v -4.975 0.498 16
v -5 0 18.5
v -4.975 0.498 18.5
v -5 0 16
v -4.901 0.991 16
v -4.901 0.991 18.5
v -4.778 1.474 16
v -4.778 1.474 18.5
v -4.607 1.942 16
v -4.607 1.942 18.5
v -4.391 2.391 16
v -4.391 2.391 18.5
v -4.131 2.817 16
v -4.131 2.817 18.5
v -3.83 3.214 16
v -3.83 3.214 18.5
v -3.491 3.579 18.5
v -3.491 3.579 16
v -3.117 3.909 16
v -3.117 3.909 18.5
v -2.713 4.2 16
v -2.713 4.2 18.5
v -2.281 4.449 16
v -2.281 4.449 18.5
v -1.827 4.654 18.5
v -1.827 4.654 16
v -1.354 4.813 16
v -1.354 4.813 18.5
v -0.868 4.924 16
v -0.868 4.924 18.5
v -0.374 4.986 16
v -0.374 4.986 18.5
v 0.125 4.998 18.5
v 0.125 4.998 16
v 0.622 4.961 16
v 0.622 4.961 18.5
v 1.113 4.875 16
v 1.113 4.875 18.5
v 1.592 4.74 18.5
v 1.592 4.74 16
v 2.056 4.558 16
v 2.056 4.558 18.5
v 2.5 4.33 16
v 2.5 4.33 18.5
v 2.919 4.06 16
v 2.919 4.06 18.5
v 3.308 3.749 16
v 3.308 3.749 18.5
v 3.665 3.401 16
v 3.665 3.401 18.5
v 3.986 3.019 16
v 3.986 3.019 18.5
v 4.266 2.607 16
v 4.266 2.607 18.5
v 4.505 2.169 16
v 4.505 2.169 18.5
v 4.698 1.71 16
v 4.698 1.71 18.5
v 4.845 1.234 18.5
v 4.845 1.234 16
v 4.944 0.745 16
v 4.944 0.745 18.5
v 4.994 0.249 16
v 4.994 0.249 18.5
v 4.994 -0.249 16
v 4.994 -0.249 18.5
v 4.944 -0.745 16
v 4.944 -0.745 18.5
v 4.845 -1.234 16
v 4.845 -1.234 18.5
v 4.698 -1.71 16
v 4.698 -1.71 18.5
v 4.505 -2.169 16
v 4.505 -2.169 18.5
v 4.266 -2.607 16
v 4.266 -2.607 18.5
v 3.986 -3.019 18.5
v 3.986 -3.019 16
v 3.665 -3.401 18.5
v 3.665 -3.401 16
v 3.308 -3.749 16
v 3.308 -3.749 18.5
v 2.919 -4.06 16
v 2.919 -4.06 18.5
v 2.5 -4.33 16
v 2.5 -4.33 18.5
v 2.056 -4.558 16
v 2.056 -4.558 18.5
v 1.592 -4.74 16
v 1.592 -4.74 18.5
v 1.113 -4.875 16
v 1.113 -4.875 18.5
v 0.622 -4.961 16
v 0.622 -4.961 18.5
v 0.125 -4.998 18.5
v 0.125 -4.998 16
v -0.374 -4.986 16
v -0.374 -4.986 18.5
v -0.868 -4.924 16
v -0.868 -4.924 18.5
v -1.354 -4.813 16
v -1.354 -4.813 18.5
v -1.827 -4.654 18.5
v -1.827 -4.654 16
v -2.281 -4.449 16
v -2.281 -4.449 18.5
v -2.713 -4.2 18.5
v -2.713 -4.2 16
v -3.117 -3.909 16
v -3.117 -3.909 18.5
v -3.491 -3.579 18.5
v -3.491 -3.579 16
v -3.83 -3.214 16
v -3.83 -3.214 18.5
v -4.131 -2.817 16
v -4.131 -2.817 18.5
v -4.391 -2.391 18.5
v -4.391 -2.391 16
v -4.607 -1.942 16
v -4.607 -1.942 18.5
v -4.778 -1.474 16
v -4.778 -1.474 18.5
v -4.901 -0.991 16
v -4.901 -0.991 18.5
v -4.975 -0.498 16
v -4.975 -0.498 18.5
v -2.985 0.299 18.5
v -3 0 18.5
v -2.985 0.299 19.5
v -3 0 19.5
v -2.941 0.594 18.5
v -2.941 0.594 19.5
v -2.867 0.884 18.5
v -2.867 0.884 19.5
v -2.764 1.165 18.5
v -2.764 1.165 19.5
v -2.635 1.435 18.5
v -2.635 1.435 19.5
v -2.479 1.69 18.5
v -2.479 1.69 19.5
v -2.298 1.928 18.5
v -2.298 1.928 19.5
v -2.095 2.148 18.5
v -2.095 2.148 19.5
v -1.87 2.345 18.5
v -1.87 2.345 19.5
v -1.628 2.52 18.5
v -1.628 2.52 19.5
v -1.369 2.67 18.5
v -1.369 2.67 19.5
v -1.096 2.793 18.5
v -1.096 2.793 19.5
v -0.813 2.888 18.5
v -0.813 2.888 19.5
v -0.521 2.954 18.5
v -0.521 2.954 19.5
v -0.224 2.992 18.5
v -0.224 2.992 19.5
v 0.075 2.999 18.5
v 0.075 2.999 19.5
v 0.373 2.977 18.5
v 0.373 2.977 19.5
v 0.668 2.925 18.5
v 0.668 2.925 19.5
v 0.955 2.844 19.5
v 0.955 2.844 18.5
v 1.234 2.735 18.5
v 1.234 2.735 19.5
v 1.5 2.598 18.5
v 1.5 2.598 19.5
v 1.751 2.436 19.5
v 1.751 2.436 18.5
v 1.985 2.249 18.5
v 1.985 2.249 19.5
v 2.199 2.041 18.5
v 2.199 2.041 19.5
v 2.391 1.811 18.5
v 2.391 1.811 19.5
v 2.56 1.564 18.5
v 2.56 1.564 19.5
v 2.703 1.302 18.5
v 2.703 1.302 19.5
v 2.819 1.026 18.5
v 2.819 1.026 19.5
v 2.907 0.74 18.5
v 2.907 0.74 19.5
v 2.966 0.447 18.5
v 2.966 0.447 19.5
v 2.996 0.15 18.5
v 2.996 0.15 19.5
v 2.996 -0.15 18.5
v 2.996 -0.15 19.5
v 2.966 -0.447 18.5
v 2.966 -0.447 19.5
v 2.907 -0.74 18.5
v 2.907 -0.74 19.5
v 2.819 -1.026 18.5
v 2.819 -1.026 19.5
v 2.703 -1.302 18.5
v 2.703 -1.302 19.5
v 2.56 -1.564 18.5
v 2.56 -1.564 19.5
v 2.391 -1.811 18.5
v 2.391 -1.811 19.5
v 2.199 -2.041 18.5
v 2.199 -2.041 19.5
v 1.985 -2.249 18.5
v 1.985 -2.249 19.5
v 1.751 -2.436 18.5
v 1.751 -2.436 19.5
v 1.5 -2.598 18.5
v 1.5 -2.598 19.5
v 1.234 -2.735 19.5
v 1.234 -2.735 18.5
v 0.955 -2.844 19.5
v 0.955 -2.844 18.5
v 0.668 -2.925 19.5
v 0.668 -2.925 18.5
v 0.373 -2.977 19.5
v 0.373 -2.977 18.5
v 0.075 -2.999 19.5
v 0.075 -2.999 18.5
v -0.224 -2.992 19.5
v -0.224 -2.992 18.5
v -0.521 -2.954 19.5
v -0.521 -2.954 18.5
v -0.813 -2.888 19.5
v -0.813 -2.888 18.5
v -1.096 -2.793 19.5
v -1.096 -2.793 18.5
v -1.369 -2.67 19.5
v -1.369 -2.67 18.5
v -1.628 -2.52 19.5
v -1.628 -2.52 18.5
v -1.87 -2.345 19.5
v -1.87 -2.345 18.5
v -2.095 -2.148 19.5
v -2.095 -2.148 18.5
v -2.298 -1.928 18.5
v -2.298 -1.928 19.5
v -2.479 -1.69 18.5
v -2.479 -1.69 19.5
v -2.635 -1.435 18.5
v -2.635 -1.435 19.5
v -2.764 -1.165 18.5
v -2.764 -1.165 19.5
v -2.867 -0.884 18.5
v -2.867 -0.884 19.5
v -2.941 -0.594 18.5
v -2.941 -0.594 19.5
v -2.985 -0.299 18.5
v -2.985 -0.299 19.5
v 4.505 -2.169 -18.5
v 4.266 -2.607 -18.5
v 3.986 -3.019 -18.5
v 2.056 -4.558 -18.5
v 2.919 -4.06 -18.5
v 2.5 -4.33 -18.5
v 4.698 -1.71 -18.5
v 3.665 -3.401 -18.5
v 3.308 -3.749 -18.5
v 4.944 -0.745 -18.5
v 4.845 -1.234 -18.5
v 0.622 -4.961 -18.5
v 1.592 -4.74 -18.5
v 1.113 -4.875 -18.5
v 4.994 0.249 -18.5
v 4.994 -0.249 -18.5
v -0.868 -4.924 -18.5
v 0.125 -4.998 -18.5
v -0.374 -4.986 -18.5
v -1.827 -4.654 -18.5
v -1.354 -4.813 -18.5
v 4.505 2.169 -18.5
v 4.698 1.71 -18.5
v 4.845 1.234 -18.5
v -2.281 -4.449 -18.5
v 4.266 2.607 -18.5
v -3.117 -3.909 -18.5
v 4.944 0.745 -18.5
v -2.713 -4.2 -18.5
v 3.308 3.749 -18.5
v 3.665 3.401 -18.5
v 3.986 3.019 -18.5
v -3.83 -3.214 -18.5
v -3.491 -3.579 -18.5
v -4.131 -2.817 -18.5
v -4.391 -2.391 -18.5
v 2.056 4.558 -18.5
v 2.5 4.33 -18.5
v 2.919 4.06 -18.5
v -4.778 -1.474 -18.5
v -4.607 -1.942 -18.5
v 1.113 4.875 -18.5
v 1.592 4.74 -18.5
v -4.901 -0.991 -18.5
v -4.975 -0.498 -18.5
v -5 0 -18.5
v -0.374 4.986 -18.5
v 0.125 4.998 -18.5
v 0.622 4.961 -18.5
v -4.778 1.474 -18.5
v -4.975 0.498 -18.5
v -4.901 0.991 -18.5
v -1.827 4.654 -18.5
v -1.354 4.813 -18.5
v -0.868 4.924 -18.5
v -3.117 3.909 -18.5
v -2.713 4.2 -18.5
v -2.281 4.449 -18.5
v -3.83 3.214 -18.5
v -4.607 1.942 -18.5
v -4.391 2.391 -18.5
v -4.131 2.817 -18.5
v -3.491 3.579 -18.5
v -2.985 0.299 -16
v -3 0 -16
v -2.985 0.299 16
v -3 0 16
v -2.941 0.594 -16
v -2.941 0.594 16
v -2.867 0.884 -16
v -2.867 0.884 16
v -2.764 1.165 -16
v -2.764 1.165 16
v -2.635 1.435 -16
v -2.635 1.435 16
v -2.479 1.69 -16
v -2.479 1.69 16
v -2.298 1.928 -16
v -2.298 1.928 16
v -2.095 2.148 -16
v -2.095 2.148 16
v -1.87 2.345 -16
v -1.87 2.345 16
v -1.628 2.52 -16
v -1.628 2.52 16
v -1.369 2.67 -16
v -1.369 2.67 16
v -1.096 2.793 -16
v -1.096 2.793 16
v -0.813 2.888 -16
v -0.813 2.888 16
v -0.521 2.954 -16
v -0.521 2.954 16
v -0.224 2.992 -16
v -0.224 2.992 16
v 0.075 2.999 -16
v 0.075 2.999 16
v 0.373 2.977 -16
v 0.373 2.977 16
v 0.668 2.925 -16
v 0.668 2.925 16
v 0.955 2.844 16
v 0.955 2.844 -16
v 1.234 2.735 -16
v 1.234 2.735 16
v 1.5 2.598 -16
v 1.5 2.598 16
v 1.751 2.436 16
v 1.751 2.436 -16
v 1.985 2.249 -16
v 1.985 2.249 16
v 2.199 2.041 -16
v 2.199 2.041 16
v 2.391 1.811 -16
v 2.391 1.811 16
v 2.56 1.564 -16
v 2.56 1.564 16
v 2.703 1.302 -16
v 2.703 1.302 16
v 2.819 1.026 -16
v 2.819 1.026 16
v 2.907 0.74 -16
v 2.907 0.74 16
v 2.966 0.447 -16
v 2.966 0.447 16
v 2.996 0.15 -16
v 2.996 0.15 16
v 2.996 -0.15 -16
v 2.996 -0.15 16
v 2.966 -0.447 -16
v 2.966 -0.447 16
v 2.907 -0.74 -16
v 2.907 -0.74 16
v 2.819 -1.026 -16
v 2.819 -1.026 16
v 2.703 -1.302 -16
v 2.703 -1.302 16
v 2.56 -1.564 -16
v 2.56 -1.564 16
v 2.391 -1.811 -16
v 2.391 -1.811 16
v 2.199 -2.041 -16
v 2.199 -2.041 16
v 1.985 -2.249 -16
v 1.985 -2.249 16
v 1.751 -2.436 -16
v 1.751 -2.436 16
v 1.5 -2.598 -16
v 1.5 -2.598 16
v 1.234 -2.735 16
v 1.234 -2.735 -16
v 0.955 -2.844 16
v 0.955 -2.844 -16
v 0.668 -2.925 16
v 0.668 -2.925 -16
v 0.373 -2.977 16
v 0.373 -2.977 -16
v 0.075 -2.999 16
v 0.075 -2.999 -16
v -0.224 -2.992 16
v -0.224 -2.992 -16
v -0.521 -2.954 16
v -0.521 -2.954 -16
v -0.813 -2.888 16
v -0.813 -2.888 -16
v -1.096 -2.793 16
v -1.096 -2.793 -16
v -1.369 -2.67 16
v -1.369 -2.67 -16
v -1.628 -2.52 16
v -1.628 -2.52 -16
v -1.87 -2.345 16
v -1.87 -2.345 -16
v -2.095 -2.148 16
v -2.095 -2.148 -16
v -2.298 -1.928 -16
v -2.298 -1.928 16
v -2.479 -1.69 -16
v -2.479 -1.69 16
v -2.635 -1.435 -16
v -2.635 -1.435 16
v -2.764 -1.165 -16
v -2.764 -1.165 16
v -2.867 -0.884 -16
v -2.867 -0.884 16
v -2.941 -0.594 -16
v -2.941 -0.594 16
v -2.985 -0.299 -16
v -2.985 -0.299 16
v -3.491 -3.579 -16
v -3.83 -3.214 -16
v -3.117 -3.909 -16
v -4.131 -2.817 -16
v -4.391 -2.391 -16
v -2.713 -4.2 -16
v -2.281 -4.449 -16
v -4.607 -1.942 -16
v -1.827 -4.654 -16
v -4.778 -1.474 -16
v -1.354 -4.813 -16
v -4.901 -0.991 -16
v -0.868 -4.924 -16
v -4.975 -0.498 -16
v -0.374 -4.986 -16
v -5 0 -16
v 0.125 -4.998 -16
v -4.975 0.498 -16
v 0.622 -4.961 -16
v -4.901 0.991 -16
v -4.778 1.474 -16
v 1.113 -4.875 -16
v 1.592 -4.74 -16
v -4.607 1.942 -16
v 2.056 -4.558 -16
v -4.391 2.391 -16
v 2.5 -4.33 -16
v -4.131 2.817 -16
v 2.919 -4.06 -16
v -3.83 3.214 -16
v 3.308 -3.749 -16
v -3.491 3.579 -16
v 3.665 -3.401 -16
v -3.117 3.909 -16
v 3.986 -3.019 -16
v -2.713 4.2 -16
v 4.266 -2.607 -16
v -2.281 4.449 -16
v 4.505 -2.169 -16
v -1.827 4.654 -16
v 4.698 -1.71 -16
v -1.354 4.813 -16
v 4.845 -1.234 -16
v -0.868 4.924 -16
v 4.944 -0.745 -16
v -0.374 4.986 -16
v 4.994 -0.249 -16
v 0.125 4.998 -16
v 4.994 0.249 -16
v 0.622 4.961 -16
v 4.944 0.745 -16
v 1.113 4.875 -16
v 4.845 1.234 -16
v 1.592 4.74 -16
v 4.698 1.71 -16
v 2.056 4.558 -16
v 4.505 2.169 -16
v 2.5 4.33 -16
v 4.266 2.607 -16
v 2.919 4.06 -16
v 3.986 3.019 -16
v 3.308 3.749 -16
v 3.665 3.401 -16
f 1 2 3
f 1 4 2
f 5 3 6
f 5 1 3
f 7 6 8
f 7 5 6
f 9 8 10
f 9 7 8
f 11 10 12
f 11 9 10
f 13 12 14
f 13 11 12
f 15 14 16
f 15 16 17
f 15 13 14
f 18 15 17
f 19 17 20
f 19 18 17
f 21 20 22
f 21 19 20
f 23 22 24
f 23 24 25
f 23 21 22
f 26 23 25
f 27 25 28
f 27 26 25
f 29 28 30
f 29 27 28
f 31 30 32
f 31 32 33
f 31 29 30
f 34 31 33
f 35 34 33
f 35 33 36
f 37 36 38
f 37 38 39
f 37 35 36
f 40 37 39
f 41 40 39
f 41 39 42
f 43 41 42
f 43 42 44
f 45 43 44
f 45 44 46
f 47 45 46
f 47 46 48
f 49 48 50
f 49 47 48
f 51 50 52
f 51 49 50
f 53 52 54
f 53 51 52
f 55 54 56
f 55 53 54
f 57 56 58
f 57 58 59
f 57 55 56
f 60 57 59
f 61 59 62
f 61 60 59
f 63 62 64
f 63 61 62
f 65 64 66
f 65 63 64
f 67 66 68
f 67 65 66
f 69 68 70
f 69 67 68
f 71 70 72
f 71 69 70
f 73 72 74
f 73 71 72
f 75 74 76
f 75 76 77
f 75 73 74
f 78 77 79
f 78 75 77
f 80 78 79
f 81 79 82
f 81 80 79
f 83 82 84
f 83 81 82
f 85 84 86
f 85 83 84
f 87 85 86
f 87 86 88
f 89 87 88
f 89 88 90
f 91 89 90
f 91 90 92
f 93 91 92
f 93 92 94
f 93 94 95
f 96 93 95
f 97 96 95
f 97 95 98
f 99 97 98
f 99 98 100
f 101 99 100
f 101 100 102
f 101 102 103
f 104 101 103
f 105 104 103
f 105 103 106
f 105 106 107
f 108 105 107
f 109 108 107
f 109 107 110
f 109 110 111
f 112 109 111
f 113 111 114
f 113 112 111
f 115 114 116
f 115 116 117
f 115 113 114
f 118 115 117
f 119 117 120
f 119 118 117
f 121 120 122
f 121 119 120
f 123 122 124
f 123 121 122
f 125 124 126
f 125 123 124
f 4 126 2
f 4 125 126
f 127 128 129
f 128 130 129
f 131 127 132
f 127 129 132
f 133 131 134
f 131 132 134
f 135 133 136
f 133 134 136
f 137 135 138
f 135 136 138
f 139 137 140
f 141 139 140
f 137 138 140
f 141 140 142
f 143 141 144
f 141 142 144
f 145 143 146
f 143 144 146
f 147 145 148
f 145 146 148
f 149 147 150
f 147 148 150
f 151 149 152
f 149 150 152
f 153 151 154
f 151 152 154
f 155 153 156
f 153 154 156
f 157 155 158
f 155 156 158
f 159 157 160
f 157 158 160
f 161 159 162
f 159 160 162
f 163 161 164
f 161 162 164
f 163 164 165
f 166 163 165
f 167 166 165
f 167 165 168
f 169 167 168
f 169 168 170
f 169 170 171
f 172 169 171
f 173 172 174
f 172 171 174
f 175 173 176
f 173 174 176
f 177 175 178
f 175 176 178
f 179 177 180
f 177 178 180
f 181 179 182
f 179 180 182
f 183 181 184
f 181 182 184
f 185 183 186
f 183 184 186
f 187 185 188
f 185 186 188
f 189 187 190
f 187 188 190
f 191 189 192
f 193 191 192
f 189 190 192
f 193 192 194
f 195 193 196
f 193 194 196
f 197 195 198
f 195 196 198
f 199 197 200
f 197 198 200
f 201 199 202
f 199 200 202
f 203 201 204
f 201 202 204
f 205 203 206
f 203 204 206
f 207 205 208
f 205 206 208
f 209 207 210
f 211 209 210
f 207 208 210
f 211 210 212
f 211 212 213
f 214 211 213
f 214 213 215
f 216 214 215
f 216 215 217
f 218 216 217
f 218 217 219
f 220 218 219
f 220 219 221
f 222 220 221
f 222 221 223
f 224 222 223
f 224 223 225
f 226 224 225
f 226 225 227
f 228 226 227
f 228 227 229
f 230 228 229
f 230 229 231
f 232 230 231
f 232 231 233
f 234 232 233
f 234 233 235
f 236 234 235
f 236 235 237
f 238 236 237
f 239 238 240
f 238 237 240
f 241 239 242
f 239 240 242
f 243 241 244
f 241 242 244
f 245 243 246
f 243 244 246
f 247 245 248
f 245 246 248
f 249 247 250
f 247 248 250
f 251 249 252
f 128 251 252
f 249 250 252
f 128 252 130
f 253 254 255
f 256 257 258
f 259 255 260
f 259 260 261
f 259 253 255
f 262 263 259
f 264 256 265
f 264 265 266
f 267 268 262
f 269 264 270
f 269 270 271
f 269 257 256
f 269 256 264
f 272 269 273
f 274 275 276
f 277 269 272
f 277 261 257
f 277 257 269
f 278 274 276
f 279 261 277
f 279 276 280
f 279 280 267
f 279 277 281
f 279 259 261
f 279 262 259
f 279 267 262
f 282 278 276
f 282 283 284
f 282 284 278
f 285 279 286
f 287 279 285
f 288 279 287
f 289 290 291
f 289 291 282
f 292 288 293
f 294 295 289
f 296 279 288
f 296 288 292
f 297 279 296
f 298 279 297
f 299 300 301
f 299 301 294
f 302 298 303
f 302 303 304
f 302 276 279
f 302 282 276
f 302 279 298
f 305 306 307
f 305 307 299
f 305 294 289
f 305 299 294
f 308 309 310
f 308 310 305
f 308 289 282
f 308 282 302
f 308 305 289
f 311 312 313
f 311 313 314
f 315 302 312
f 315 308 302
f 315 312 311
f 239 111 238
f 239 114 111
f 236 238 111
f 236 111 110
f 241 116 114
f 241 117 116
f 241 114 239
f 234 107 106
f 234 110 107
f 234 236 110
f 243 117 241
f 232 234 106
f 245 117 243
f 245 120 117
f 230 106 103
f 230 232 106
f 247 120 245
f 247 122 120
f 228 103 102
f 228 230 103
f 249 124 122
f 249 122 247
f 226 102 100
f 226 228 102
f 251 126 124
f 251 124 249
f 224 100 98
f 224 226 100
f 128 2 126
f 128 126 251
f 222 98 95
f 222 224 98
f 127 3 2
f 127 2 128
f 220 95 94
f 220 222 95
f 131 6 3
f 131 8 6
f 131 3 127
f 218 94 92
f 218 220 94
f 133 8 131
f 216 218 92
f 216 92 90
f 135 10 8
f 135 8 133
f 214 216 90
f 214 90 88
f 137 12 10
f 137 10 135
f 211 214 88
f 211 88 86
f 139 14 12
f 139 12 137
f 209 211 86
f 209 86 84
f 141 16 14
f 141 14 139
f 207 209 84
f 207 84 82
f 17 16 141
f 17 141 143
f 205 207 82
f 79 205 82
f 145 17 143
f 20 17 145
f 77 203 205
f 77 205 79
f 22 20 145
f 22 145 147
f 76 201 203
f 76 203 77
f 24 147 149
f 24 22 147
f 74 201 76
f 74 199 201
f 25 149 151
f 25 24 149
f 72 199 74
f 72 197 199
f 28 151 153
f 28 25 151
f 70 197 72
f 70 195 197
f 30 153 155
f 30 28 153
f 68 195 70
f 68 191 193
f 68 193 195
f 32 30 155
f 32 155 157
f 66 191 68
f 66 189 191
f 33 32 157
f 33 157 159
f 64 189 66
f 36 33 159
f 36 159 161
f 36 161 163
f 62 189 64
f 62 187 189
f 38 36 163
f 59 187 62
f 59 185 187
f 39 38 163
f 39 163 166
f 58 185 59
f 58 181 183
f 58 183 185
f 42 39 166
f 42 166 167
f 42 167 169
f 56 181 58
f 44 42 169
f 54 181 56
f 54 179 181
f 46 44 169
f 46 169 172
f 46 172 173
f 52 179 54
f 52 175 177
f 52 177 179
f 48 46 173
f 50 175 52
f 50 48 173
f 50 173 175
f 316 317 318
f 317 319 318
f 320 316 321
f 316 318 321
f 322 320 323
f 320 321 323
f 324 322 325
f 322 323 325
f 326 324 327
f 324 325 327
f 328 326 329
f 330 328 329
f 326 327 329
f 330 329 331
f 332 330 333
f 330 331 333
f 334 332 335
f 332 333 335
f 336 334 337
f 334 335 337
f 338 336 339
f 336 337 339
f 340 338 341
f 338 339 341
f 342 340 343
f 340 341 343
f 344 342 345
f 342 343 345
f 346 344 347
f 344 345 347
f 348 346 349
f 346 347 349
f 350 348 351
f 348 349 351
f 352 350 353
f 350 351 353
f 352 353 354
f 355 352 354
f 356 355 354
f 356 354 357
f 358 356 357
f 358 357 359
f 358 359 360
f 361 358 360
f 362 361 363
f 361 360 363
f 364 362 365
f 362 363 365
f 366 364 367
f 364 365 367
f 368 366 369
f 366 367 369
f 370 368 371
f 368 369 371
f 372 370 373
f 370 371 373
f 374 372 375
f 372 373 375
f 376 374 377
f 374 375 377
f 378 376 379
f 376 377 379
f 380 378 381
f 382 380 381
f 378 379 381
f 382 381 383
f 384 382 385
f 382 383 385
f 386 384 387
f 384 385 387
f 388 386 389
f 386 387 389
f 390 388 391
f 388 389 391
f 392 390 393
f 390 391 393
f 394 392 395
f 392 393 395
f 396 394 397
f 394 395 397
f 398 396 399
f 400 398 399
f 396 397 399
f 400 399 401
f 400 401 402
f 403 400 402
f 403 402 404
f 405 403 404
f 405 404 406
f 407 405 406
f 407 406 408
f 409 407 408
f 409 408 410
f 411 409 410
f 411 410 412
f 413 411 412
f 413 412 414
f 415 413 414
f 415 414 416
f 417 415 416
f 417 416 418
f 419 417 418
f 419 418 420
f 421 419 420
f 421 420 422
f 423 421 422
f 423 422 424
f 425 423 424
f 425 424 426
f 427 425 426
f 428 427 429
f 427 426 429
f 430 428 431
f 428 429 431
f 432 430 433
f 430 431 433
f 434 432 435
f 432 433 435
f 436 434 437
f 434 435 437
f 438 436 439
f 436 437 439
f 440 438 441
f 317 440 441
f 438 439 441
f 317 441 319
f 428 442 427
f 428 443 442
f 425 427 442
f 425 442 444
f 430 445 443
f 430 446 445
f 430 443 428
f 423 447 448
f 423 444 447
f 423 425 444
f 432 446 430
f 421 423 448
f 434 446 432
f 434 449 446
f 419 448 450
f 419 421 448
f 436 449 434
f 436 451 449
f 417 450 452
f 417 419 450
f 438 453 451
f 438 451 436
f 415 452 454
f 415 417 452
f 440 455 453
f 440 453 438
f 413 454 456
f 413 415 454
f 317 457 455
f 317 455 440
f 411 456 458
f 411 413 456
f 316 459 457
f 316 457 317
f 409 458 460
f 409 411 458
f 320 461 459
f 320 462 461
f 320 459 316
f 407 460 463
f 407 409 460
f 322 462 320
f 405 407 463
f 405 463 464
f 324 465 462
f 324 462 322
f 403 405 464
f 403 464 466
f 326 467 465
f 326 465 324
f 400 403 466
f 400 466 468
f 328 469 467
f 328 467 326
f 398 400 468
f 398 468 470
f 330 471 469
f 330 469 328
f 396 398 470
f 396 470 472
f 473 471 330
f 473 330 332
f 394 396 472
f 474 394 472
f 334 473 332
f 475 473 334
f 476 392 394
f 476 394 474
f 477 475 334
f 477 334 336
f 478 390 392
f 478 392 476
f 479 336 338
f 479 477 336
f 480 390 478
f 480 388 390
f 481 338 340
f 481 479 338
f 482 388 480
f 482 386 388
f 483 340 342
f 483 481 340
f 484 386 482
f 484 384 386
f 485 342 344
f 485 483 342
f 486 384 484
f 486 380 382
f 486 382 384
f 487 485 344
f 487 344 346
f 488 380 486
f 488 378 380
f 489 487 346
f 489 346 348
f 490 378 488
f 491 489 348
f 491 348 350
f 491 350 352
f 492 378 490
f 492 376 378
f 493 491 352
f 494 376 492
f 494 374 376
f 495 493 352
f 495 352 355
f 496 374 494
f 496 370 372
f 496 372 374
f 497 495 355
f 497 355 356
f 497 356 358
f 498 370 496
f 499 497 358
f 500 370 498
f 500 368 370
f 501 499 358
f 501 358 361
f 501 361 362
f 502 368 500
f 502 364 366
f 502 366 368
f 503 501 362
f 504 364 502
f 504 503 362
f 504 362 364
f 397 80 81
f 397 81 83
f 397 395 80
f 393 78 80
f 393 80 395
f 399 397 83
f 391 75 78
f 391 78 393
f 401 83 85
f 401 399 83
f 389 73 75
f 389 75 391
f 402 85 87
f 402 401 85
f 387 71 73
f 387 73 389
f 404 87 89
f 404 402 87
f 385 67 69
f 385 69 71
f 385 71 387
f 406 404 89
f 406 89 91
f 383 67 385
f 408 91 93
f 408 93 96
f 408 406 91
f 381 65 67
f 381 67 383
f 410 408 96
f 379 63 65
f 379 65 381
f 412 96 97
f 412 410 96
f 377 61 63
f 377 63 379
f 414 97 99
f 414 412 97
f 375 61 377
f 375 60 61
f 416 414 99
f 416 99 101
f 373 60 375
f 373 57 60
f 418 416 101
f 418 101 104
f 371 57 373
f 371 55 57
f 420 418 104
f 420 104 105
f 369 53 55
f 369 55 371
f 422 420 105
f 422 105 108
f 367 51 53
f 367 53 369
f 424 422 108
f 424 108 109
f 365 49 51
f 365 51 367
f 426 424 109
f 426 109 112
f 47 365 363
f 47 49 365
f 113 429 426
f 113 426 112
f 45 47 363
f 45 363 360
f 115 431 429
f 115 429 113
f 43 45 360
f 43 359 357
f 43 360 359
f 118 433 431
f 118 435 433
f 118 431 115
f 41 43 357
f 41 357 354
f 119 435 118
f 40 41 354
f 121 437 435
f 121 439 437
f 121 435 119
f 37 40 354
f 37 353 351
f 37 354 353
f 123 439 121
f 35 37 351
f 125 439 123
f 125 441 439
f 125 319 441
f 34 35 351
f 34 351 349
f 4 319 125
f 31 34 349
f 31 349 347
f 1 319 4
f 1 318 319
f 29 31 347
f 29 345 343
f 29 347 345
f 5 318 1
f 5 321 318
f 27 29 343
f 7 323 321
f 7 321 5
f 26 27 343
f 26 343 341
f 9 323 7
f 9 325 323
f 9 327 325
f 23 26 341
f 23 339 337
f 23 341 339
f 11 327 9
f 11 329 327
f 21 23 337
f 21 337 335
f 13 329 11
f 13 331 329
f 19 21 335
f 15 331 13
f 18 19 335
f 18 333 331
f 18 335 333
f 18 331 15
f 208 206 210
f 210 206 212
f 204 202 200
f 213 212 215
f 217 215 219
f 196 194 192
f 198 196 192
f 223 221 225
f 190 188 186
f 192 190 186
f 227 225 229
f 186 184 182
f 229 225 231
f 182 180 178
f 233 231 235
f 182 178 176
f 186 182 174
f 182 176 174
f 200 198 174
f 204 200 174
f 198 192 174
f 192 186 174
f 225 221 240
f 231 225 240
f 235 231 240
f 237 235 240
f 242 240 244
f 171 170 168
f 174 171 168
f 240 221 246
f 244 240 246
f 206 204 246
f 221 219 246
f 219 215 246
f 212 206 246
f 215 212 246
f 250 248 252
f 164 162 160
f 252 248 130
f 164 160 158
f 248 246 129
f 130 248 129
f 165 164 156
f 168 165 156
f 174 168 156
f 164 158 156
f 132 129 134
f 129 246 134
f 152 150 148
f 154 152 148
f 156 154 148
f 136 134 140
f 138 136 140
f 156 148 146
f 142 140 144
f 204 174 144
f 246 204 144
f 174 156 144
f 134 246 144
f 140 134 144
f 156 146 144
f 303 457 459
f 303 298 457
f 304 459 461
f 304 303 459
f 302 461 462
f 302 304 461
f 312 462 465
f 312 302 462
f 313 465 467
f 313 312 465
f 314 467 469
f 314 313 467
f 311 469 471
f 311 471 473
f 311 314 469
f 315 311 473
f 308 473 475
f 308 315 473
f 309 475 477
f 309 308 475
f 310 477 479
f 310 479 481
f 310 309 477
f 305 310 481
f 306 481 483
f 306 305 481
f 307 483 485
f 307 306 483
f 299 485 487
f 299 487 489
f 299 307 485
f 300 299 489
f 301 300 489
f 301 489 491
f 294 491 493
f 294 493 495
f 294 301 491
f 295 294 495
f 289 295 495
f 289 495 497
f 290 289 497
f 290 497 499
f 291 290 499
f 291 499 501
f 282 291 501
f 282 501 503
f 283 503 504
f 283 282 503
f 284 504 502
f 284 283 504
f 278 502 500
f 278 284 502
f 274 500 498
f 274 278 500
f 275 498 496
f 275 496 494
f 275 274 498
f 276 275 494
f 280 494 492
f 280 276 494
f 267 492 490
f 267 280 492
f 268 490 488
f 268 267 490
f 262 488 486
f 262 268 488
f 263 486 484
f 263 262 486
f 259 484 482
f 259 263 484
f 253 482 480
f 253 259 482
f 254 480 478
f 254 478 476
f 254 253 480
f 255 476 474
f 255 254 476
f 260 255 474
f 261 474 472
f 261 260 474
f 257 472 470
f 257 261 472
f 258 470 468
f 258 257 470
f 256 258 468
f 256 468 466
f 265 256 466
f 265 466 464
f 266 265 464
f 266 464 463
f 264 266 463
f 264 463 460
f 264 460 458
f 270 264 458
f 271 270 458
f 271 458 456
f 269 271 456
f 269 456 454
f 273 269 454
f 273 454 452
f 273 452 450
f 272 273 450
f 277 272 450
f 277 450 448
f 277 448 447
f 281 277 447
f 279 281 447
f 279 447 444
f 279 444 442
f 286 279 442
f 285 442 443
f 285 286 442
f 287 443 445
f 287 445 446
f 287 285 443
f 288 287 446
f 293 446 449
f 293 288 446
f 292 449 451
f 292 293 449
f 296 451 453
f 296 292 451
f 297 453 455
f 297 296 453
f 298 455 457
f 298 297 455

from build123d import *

# Parameters (mm, degrees)
F0_W   = 3
F0_H   = 32
F0_H_2 = 1


with BuildPart() as f1:
    # F0 (on Front) → F1 (revolve)
    with BuildSketch(Plane.XZ):
        with Locations((-1.5, 0)):
            Rectangle(F0_W, F0_H)
        Polygon((-5, 16), (-3, 16), (0, 16), (0, 18.5), (-3, 18.5), (-5, 18.5), align=None)
        Polygon((0, -16), (-3, -16), (-5, -16), (-5, -18.5), (0, -18.5), align=None)
        with Locations((-1.5, 19)):
            Rectangle(F0_W, F0_H_2)
    revolve(axis=Axis((0, 0, 0.5), (0, 0, -1)))


solid = f1.part
